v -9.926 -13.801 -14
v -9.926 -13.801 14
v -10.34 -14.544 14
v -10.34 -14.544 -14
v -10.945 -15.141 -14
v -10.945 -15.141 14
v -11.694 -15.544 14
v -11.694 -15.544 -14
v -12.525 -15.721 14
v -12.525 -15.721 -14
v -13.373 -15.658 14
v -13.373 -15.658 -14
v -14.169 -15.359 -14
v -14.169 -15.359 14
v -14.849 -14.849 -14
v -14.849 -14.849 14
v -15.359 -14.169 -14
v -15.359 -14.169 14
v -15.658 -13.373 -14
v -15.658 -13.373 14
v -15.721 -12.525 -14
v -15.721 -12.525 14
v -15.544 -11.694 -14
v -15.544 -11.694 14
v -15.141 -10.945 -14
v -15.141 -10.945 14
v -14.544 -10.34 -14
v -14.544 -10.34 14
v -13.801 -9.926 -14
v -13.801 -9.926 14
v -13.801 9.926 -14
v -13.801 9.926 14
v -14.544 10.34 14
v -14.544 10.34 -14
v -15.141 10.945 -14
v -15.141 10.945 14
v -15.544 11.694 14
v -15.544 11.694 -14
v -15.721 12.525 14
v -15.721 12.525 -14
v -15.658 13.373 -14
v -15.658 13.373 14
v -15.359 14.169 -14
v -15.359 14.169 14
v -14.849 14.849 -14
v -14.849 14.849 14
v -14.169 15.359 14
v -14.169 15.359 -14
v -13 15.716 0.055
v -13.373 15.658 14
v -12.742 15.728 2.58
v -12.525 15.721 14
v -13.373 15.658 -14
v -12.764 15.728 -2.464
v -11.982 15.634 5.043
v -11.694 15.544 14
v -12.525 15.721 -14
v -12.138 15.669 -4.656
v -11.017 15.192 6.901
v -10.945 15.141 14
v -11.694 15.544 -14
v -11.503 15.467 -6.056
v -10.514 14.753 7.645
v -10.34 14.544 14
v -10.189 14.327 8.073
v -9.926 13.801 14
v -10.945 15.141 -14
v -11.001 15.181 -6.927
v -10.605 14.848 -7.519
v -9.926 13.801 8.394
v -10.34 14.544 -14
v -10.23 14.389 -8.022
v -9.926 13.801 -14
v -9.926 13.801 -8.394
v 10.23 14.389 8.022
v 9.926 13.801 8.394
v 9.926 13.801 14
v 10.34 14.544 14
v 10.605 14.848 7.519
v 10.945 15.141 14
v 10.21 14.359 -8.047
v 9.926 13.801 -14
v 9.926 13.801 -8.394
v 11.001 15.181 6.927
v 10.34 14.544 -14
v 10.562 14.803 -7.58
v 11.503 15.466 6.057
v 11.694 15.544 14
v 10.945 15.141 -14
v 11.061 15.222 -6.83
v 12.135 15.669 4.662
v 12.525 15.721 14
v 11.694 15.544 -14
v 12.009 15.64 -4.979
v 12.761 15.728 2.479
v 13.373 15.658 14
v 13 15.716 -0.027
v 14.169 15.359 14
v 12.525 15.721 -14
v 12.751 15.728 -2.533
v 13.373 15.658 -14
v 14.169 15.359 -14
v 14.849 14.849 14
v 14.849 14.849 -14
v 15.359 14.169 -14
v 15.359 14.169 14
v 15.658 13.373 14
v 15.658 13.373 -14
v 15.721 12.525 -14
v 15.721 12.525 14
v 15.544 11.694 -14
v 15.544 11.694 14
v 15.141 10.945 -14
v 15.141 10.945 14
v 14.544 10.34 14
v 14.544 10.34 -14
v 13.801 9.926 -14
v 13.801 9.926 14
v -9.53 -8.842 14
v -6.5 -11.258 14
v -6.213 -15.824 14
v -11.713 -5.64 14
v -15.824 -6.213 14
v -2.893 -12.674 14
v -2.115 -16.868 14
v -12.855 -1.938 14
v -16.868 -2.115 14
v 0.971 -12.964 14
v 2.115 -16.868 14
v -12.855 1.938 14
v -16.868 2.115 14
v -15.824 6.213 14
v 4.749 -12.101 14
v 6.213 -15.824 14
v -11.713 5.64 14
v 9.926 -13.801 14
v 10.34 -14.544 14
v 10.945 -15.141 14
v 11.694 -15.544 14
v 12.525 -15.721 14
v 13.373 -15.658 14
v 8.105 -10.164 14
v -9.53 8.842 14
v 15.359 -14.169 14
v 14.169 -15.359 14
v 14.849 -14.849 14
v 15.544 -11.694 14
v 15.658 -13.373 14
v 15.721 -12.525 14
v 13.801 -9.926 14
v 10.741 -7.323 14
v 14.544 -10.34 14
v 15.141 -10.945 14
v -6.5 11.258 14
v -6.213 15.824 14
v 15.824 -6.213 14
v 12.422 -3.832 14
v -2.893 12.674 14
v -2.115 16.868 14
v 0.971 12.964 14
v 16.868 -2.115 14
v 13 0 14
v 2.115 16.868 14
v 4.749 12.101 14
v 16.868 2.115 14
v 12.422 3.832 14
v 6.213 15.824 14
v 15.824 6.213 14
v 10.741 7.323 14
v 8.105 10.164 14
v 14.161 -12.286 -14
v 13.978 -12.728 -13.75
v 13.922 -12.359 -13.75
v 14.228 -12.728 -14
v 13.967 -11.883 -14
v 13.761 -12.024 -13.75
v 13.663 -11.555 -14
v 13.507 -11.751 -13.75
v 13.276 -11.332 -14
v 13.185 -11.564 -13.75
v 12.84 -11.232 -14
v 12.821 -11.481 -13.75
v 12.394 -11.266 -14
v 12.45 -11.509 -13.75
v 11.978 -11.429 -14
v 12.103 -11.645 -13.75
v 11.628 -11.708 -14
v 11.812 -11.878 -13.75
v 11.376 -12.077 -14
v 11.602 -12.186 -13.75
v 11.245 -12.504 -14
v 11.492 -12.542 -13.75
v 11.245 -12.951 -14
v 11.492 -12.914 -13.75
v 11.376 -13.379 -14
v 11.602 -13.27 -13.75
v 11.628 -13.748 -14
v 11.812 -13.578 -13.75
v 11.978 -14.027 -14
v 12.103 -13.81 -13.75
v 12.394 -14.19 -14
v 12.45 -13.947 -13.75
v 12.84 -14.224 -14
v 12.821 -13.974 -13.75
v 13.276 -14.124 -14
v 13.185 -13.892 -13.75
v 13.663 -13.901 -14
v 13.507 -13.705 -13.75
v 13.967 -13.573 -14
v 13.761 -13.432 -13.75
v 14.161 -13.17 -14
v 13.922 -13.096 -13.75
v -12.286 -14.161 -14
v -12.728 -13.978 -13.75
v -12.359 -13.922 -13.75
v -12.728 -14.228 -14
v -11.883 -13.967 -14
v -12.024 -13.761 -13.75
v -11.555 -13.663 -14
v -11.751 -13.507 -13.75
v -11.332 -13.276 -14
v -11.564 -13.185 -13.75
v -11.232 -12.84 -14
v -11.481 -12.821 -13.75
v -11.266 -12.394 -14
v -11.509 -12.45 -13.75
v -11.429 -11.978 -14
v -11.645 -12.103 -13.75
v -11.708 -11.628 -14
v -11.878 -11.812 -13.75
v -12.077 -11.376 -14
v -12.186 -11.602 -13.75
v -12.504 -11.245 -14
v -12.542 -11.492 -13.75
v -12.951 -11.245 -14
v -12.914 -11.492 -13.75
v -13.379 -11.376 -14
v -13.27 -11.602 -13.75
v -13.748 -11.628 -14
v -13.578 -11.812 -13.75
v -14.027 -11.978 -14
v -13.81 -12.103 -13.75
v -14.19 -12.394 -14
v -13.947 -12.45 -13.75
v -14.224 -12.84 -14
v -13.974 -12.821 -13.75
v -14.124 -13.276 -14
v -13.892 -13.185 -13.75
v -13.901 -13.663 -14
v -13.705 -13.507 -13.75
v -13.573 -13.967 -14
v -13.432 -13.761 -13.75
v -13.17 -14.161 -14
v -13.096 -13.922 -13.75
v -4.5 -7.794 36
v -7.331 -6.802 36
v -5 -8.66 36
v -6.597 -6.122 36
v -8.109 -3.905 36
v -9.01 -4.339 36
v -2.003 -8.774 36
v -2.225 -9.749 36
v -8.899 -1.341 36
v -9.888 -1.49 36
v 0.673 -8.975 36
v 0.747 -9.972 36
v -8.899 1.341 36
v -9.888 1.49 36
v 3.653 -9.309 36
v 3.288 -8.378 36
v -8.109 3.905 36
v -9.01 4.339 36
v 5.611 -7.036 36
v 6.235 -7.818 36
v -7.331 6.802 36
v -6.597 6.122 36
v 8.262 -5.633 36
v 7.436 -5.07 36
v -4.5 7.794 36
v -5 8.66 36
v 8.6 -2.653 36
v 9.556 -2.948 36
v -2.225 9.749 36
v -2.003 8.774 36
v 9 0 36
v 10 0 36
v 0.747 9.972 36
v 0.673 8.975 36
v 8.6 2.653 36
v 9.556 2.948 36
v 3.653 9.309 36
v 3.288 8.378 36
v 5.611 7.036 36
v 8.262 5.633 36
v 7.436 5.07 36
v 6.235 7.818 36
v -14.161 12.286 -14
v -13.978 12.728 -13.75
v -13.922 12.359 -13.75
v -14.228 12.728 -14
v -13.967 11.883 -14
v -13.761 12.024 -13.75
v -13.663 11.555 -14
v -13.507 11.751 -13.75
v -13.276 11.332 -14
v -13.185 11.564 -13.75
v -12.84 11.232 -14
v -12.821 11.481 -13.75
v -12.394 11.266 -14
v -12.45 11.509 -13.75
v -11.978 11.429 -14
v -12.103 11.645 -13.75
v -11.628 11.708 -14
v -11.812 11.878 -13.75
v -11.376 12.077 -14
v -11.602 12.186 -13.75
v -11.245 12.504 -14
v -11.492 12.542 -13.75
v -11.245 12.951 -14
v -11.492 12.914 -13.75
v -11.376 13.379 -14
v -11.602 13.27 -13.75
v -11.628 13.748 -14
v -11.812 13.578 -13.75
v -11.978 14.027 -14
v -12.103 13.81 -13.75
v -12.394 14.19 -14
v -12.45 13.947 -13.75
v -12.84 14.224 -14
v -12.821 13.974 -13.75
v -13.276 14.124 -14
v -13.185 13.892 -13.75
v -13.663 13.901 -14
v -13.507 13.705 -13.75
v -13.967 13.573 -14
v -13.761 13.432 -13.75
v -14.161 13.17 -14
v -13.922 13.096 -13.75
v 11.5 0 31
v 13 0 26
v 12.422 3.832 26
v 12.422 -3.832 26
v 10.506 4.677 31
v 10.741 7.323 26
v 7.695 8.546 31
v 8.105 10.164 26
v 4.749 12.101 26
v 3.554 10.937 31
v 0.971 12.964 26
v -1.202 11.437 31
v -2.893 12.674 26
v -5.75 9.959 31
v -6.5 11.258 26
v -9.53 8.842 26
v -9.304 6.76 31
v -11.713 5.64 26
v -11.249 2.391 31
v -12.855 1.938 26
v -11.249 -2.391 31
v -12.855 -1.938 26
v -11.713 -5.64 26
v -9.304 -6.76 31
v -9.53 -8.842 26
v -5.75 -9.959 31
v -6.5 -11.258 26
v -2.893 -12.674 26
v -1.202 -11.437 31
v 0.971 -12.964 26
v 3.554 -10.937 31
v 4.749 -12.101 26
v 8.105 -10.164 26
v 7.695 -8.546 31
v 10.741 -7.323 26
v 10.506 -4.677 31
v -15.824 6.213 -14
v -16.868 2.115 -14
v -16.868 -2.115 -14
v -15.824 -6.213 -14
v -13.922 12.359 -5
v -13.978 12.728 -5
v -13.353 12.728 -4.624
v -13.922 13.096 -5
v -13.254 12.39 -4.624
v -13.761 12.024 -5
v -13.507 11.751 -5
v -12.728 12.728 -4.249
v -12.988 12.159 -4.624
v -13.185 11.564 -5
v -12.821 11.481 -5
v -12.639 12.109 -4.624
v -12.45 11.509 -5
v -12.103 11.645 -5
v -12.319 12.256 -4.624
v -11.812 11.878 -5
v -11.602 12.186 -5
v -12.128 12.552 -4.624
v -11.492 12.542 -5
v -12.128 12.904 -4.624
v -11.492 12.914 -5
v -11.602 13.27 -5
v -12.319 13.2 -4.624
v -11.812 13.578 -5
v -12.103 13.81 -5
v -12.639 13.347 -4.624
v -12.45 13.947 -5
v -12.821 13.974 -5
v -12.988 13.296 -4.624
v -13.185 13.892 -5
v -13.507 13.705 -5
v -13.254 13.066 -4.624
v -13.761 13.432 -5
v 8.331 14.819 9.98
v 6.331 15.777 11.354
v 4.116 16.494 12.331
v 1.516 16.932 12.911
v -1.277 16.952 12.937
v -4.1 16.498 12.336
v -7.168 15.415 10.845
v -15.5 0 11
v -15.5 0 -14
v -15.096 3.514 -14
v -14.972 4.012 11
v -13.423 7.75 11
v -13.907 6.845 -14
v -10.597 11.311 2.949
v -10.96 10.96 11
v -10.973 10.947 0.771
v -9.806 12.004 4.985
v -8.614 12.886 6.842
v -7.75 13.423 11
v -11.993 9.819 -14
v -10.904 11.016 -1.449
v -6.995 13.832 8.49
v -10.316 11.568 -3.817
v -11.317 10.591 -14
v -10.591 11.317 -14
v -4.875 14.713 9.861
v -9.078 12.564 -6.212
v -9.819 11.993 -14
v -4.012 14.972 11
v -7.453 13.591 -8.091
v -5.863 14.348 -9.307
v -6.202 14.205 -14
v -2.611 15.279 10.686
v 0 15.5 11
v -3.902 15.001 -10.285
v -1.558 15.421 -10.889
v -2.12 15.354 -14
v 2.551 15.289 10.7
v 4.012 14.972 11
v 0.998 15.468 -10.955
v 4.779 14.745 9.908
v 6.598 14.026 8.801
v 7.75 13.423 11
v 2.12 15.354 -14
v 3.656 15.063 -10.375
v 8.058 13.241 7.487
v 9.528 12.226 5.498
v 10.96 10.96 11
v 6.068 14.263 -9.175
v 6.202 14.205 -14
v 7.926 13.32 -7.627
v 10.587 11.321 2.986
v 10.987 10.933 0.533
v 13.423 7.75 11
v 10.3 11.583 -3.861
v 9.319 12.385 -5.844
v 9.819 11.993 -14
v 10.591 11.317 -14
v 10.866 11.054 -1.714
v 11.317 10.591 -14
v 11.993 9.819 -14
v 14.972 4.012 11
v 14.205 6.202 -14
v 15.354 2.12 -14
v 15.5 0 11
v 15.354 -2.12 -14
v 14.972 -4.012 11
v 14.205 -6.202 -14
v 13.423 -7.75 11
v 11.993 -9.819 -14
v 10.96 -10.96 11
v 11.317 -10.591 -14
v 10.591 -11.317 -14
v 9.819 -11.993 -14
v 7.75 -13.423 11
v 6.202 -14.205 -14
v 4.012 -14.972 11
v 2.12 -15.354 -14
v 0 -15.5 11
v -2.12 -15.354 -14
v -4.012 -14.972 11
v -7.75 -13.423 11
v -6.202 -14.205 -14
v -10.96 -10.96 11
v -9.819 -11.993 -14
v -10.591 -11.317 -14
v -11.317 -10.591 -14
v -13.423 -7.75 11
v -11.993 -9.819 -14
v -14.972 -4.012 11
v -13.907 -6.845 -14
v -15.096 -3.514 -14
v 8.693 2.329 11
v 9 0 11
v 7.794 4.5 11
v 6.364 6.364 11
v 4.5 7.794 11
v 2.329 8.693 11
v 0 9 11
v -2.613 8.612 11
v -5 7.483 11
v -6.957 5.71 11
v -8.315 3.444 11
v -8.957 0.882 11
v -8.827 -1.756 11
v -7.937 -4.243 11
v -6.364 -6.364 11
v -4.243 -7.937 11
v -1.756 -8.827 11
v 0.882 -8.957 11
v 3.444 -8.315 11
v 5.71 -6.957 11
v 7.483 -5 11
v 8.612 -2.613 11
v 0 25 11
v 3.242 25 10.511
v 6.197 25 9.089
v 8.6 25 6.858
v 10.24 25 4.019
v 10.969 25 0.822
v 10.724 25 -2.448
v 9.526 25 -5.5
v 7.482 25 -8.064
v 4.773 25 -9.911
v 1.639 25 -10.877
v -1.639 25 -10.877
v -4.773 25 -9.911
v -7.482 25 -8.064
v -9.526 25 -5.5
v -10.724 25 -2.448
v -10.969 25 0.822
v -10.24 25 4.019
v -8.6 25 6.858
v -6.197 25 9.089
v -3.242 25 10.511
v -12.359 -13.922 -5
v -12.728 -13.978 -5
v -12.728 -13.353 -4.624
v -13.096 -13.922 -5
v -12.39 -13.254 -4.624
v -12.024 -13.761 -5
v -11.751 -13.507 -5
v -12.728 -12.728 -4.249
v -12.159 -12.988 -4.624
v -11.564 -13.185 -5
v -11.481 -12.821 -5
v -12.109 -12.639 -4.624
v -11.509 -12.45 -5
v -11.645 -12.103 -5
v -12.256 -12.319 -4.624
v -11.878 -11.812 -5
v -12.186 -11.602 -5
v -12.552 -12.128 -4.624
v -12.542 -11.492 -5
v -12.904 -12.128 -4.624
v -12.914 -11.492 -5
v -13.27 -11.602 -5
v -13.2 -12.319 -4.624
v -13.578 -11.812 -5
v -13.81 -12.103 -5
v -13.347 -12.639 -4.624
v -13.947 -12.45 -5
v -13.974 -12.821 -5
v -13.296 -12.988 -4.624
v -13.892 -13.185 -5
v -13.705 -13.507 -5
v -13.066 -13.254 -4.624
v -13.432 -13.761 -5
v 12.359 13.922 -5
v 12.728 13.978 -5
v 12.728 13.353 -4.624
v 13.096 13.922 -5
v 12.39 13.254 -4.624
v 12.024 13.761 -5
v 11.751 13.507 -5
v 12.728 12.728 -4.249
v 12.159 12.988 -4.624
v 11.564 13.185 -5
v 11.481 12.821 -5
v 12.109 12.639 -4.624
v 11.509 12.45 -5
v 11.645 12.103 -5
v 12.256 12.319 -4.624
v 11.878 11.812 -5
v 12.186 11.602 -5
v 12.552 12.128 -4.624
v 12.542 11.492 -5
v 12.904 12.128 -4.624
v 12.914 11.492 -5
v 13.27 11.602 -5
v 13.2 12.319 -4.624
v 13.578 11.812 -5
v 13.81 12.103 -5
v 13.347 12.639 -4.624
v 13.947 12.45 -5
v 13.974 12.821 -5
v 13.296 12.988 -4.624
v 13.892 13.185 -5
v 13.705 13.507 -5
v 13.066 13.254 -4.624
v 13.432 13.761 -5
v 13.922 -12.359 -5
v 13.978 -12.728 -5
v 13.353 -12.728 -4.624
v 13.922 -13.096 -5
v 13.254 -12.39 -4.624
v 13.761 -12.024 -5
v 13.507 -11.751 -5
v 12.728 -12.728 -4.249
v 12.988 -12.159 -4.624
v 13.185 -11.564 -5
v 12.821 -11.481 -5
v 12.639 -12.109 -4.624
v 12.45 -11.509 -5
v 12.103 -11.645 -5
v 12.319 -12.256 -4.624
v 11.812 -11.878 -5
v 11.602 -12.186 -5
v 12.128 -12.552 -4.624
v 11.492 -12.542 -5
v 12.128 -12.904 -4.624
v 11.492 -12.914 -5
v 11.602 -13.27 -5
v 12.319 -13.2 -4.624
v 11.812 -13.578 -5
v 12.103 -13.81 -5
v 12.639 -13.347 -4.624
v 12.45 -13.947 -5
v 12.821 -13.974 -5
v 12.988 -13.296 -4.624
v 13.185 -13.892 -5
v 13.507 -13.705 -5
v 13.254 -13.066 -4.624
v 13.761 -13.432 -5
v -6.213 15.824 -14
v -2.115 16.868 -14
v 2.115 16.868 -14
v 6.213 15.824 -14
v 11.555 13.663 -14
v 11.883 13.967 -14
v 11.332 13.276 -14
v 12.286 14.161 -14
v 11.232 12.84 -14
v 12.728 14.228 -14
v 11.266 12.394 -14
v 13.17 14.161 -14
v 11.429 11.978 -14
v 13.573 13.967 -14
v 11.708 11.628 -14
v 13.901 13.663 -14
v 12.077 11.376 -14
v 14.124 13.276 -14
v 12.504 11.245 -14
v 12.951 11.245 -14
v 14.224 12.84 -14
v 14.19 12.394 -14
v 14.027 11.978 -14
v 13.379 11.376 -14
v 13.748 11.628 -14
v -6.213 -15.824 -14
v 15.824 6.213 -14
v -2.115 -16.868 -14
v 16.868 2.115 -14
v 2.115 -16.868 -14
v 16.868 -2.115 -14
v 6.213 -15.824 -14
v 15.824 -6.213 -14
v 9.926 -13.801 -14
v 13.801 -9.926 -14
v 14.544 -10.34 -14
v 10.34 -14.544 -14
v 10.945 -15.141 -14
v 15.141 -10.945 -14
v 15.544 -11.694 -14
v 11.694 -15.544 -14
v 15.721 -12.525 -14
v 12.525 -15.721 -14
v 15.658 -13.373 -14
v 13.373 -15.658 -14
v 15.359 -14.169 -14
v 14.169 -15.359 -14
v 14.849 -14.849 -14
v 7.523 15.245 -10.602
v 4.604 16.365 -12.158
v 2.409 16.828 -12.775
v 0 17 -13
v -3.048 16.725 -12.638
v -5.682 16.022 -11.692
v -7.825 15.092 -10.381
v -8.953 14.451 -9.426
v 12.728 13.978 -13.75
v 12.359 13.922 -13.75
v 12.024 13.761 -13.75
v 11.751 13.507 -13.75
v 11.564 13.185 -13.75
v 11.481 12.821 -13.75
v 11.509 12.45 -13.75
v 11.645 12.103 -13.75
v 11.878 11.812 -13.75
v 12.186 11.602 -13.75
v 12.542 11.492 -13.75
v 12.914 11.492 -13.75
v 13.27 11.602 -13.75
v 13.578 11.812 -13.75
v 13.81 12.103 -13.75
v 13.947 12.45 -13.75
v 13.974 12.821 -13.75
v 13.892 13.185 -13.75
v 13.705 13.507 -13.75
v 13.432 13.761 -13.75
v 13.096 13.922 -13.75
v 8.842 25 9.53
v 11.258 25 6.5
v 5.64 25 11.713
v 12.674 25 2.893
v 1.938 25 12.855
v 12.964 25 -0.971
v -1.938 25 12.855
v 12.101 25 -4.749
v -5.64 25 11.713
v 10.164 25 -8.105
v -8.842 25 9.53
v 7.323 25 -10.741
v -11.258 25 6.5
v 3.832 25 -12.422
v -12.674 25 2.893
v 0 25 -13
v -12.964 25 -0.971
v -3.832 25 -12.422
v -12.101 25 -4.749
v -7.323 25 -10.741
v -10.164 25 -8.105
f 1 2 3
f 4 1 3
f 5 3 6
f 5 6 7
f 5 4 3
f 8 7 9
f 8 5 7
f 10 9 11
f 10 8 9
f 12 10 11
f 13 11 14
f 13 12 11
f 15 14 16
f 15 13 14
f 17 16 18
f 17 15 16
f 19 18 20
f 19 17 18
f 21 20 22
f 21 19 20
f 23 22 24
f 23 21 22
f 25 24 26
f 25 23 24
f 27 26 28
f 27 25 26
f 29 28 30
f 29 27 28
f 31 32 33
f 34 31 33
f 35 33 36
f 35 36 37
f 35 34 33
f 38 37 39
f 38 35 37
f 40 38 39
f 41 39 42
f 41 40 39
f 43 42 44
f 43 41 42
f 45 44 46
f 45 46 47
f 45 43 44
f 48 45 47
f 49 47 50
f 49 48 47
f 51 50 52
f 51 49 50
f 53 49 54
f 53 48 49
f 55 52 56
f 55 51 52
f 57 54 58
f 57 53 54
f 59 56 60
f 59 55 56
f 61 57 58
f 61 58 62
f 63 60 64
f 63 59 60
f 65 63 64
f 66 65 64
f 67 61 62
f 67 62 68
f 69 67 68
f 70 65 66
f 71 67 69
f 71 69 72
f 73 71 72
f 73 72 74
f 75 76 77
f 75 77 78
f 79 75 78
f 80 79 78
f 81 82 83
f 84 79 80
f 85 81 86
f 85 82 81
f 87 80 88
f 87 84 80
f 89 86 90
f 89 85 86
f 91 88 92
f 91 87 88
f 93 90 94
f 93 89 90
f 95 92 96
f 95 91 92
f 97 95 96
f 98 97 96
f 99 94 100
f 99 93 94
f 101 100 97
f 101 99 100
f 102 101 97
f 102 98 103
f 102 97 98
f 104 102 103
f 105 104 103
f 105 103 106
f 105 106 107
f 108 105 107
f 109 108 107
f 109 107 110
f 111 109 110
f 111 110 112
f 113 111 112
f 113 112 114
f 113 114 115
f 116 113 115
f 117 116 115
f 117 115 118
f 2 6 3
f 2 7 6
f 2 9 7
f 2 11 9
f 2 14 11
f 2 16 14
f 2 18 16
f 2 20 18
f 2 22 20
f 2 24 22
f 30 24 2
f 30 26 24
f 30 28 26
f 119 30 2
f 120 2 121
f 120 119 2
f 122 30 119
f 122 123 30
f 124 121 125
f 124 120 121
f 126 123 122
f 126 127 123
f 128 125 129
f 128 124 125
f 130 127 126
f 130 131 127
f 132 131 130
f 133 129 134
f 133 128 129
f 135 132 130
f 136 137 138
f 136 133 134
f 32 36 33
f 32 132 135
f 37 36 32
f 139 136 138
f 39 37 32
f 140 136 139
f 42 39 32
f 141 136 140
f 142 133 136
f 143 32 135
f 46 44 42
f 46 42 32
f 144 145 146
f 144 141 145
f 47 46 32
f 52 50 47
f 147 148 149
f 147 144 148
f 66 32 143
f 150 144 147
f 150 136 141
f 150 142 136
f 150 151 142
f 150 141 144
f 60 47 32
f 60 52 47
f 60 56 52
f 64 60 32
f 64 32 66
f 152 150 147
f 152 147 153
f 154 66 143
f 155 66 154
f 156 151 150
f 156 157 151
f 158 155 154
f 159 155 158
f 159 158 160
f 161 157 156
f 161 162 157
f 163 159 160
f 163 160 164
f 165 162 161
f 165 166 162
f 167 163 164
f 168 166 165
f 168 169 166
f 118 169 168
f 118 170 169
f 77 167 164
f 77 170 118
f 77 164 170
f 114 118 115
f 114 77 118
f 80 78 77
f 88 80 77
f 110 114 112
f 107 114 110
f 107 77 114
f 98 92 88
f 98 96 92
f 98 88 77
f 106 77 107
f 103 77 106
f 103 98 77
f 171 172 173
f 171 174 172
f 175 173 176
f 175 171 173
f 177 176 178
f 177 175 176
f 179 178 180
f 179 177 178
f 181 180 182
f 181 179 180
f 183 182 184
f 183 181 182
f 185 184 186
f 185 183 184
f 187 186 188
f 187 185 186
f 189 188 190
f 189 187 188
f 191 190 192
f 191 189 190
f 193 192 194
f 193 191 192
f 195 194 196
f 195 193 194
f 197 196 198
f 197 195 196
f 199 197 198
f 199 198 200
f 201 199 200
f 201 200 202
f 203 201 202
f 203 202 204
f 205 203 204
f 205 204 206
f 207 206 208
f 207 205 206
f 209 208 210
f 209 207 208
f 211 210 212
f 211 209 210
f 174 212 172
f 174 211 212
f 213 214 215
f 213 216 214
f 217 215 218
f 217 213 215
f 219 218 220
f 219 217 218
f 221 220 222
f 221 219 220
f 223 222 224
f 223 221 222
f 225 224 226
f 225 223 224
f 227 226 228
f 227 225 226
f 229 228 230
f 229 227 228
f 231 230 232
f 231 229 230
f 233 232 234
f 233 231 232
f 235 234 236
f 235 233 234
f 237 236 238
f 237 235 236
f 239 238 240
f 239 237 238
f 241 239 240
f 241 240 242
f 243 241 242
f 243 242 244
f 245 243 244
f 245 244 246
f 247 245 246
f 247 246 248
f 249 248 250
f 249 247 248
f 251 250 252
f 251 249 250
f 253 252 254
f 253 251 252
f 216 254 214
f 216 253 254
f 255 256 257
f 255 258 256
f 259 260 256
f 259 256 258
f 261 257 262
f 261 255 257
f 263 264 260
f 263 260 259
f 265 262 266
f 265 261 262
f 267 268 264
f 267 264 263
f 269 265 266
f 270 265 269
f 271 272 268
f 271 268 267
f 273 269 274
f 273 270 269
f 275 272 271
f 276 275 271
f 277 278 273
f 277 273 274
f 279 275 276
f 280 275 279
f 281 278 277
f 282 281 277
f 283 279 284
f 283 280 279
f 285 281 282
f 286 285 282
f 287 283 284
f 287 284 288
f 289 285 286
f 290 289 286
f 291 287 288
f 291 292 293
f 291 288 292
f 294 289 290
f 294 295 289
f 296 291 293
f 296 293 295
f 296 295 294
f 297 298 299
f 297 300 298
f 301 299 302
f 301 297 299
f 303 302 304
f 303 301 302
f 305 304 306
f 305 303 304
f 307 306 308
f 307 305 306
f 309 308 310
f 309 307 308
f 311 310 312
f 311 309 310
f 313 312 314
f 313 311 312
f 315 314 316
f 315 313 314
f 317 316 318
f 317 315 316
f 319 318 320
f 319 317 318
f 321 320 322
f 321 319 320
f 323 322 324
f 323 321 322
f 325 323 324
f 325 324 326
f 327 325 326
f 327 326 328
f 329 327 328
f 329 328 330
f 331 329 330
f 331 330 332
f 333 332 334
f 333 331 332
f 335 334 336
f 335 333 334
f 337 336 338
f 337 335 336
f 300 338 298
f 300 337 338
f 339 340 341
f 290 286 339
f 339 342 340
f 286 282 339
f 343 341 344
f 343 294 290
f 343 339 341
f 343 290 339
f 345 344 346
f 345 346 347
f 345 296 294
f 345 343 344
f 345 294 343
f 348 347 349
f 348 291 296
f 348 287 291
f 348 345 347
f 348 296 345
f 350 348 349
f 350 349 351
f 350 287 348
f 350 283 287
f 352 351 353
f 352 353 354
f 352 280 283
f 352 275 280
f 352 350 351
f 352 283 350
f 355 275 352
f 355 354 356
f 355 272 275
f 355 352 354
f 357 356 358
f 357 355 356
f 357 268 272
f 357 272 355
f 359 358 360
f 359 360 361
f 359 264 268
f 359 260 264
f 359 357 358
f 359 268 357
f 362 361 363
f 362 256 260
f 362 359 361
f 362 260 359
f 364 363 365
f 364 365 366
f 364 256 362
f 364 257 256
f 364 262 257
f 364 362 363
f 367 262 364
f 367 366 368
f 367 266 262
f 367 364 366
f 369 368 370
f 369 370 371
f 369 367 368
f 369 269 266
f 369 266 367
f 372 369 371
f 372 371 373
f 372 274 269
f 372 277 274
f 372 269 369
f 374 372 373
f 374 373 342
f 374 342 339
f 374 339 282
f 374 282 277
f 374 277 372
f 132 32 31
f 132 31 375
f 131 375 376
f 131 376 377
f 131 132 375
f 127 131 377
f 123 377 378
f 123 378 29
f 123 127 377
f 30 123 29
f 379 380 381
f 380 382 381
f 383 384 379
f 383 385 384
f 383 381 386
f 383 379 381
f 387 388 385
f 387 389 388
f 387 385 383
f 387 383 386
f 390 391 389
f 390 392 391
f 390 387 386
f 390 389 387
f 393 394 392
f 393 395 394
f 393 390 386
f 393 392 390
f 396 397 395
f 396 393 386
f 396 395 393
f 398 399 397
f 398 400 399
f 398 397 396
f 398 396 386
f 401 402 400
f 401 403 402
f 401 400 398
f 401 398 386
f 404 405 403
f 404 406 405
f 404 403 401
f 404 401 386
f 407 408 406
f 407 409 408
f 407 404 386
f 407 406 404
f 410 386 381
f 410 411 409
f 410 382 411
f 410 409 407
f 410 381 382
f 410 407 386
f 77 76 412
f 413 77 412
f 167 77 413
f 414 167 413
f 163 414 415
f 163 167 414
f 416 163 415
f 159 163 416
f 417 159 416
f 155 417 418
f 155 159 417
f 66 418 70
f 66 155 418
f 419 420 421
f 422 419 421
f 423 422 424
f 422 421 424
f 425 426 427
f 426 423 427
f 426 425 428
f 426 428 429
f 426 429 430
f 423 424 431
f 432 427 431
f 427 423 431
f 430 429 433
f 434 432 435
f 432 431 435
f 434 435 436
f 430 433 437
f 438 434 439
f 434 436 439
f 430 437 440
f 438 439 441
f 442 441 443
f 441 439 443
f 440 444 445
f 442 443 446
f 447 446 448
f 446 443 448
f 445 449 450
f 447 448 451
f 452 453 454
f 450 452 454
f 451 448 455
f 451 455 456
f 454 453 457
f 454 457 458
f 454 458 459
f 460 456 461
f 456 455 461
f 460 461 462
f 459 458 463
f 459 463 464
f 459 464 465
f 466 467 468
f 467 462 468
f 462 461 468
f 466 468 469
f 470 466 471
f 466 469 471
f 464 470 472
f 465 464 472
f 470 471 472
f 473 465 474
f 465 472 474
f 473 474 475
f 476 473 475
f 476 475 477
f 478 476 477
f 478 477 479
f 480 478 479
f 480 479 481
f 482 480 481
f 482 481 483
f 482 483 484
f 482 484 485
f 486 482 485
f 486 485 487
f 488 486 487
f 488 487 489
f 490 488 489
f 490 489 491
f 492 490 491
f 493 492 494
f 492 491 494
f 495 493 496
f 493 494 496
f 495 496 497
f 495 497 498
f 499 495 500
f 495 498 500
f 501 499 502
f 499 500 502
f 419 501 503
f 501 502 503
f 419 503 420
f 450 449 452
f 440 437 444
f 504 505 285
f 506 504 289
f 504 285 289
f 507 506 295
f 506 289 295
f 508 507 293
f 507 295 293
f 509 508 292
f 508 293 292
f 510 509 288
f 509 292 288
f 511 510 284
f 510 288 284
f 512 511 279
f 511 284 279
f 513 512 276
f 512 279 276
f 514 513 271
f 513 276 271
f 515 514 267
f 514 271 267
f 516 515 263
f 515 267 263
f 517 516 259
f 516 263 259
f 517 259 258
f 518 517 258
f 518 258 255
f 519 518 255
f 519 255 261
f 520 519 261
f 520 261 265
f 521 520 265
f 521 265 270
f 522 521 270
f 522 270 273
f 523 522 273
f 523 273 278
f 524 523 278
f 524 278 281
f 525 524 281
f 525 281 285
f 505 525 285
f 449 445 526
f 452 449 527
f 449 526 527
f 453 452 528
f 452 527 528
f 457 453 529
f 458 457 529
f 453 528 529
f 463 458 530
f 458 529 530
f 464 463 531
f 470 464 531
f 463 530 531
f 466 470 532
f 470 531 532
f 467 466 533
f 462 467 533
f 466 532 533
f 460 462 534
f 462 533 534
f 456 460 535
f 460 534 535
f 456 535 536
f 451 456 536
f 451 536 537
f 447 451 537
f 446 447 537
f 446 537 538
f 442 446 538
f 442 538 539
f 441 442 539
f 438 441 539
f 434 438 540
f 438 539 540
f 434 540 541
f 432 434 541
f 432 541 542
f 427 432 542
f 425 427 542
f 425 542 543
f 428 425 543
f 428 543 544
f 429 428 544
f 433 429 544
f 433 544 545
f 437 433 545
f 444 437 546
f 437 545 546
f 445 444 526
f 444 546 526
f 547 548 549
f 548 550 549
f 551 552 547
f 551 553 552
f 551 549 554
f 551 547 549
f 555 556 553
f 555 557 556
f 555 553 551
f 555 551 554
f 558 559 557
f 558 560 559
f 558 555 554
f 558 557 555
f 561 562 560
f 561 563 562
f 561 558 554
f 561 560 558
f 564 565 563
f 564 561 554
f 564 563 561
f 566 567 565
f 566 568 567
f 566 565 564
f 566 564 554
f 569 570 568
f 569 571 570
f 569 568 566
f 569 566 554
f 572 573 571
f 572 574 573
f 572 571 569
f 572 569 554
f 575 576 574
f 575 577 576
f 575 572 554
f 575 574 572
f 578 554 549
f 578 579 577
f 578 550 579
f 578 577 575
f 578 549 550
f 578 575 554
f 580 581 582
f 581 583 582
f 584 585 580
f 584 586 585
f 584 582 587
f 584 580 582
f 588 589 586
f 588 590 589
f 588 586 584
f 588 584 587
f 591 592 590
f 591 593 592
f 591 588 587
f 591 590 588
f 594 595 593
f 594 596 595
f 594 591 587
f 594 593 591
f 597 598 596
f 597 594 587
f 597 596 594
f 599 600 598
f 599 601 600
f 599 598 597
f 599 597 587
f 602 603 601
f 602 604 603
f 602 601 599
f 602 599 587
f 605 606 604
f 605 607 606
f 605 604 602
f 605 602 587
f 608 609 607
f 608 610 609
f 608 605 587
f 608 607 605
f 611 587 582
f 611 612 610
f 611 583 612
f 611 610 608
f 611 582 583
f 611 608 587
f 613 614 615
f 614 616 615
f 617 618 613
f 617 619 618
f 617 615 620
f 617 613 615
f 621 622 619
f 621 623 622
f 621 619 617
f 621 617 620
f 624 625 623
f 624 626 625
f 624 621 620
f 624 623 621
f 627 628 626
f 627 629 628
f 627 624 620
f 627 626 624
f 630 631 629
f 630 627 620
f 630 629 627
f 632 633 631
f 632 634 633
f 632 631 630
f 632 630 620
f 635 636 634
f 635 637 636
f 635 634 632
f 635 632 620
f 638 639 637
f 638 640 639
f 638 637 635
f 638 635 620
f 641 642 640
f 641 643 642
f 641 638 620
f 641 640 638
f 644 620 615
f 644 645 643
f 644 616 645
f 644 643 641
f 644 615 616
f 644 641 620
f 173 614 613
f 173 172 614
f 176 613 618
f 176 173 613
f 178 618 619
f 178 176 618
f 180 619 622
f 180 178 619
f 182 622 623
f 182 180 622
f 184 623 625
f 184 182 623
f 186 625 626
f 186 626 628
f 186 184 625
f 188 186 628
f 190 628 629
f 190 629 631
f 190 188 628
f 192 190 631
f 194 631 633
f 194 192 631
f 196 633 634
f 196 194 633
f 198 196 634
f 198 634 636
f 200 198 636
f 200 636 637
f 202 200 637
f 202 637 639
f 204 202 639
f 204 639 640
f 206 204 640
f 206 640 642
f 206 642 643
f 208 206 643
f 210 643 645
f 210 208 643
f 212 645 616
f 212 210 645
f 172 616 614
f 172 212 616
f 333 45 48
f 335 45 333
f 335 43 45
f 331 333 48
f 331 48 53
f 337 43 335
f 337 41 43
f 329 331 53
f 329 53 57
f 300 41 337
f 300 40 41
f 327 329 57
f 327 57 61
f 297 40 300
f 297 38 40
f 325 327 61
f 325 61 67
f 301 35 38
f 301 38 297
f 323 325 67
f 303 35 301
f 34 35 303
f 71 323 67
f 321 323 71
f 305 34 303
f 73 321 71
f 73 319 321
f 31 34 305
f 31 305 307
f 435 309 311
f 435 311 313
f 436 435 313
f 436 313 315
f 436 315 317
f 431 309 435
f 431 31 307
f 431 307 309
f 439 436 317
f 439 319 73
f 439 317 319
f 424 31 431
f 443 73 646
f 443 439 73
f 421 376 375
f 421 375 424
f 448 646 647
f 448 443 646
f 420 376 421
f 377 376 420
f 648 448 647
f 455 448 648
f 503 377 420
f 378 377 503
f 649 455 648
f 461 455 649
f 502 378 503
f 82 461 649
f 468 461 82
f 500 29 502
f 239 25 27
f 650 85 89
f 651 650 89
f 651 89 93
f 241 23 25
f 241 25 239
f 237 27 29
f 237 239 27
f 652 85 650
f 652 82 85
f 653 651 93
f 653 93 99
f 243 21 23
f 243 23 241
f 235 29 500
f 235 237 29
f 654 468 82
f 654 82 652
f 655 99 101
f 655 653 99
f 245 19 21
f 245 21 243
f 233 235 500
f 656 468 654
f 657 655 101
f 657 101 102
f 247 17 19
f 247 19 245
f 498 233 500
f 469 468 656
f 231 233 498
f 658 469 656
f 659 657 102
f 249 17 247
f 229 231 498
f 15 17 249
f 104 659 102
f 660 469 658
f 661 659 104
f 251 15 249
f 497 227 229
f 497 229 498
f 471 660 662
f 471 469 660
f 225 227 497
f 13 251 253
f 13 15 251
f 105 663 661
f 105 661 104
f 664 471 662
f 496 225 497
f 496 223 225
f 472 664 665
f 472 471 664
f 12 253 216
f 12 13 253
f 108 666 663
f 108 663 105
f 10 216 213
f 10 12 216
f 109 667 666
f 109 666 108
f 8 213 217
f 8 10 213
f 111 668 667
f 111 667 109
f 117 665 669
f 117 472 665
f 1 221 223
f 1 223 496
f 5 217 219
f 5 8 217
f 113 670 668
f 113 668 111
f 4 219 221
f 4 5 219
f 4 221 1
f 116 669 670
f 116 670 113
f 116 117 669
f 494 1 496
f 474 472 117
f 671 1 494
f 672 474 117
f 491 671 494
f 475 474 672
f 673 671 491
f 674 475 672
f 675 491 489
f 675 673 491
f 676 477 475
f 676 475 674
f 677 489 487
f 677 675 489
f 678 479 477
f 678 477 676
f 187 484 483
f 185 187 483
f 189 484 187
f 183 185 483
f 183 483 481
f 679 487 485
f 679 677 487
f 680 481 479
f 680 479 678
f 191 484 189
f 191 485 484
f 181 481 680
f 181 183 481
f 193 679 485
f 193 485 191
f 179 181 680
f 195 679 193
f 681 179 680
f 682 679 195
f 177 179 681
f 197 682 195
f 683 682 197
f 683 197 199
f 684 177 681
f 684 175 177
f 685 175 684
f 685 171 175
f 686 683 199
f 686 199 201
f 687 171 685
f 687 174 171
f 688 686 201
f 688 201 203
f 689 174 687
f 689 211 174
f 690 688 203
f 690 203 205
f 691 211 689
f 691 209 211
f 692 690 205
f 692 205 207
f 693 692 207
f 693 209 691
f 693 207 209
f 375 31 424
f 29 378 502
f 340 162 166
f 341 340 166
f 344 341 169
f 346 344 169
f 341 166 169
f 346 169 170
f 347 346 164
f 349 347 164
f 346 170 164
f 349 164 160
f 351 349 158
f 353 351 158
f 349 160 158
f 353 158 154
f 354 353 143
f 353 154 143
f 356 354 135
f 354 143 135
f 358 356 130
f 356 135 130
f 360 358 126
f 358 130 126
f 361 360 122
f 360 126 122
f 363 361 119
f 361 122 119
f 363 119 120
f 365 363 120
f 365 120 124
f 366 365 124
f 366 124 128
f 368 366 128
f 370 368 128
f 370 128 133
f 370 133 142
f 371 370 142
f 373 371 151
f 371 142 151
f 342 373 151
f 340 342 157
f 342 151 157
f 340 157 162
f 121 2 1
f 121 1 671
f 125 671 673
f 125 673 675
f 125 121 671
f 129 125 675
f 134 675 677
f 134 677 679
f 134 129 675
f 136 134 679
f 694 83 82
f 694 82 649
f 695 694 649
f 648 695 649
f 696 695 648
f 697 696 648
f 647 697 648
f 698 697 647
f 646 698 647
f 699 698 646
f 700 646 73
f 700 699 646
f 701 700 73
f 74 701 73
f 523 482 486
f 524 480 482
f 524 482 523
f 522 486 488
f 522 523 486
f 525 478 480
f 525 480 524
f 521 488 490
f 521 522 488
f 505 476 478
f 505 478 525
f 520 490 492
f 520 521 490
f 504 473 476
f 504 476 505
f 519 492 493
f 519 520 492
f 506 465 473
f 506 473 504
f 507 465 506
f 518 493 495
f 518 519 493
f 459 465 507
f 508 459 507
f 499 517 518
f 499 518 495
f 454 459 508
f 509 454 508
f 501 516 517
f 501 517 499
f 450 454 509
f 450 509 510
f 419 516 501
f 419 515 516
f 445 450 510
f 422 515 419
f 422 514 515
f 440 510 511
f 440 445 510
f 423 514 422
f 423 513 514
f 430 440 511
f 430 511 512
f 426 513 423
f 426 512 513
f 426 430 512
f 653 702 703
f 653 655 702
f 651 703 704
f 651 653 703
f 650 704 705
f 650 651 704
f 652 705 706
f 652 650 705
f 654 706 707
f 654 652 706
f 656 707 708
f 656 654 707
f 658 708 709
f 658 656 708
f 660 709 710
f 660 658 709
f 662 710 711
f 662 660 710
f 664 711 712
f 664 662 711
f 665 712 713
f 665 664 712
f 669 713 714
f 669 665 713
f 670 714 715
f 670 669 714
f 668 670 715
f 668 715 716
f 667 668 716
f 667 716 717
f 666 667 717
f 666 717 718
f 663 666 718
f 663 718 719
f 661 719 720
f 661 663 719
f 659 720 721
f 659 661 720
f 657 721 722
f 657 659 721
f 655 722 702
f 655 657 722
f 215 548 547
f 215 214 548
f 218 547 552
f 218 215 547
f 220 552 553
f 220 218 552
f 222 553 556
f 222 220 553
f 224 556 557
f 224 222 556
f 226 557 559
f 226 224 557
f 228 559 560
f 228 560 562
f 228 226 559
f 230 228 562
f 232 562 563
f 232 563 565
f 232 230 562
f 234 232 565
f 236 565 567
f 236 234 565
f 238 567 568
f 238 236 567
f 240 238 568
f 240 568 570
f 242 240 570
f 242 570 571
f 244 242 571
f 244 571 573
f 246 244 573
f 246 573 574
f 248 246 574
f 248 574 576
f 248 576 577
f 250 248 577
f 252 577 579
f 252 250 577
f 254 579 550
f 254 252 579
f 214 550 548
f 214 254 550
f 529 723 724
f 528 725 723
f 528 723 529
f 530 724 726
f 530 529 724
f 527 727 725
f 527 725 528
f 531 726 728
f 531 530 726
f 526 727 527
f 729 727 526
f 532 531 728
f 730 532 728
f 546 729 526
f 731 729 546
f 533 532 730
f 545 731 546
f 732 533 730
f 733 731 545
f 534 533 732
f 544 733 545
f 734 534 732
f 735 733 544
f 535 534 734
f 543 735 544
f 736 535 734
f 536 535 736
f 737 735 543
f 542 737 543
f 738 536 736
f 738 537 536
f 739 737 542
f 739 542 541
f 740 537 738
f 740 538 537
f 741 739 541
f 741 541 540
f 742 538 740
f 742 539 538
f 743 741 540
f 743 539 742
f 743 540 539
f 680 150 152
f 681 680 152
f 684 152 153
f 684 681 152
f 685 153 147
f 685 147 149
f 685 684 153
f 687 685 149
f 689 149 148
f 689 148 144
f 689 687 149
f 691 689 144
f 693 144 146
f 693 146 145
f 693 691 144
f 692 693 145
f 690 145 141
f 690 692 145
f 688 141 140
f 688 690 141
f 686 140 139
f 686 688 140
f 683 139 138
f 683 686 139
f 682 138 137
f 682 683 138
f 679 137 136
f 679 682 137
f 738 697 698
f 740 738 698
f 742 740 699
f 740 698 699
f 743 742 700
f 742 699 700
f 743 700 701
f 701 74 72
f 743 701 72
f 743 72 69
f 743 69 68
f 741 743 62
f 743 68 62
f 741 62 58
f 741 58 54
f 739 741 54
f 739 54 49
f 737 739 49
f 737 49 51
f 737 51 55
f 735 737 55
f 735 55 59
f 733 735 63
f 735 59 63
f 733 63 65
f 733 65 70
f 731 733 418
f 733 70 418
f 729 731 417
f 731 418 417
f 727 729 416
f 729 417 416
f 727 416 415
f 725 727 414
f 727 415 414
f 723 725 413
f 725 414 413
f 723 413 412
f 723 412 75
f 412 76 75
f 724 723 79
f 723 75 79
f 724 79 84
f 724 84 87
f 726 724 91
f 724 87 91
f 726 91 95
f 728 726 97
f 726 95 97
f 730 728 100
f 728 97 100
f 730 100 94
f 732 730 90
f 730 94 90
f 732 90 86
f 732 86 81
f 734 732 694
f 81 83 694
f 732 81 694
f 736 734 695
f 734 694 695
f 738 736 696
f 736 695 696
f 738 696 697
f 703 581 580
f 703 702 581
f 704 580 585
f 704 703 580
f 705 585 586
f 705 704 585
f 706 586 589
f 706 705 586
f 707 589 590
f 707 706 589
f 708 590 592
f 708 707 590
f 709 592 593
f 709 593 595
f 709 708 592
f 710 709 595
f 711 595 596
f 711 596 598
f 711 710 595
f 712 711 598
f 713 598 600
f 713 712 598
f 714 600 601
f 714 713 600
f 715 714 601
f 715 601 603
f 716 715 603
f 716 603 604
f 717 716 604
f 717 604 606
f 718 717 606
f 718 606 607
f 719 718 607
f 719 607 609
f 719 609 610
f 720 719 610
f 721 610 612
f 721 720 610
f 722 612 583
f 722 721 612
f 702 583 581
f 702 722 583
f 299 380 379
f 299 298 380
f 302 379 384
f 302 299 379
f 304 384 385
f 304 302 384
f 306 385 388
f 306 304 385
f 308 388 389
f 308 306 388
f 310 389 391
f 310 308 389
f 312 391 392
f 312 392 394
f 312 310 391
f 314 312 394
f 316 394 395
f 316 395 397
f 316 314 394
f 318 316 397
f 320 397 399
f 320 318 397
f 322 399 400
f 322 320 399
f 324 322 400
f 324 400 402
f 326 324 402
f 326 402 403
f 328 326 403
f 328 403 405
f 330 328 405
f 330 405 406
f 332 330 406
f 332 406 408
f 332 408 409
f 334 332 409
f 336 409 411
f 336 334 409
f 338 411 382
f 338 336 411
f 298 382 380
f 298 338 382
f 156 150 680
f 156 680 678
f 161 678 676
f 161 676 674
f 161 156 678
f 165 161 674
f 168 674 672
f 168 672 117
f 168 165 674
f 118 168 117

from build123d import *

# Parameters (mm, degrees)
SKETCH1_R           = 17
BOSS_EXTRUDE1_DEPTH = 14
SKETCH2_R           = 13
BOSS_EXTRUDE2_DEPTH = 22
SKETCH3_R           = 13
BOSS_EXTRUDE3_DEPTH = 25
SKETCH4_R           = 15.5
CUT_EXTRUDE1_DEPTH  = 25
SKETCH5_R           = 9
CUT_EXTRUDE2_DEPTH  = 25
CHAMFER2_SIZE       = 10
CHAMFER2_SIZE2      = 3
BOSS_EXTRUDE4_DEPTH = 28
CIRPATTERN1_COUNT   = 4
SKETCH6_R           = 11
CUT_EXTRUDE3_DEPTH  = 25
CIRPATTERN2_COUNT   = 4


with BuildPart() as part:
    # Sketch1 → Boss-Extrude1 (new body, symmetric)
    with BuildSketch(Plane.XY):
        Circle(SKETCH1_R)
    extrude(amount=BOSS_EXTRUDE1_DEPTH, both=True)

    # Sketch2 → Boss-Extrude2 (add)
    with BuildSketch(Plane.XY.offset(14)):
        Circle(SKETCH2_R)
    extrude(amount=BOSS_EXTRUDE2_DEPTH)

    # Sketch3 → Boss-Extrude3 (add)
    with BuildSketch(Plane(origin=(0, 0, 0), x_dir=(1, 0, 0), z_dir=(0, 1, 0))):
        with Locations(Location((0, 0, 0), (0, 0, 90))):  # turned: the seam where the file's is
            Circle(SKETCH3_R)
    extrude(amount=BOSS_EXTRUDE3_DEPTH)

    # Sketch4 → Cut-Extrude1 (cut)
    with BuildSketch(Plane(origin=(0, 0, -14), x_dir=(-1, 0, 0), z_dir=(0, 0, -1))):
        Circle(SKETCH4_R)
    extrude(amount=-CUT_EXTRUDE1_DEPTH, mode=Mode.SUBTRACT)

    # Sketch5 → Cut-Extrude2 (cut)
    with BuildSketch(Plane.XY.offset(36)):
        Circle(SKETCH5_R)
    extrude(amount=-CUT_EXTRUDE2_DEPTH, mode=Mode.SUBTRACT)

    # Chamfer2
    chamfer2_edges = [part.edges().sort_by_distance(p)[0] for p in [
        (-13, 0, 36),
    ]]
    chamfer2_side = [part.faces().sort_by_distance(p)[0] for p in [
        (-13, 0, 25),
    ]]
    chamfer(chamfer2_edges, length=CHAMFER2_SIZE, length2=CHAMFER2_SIZE2, reference=chamfer2_side[0])

    # Sketch7 → Boss-Extrude4 (add)
    with BuildSketch(Plane(origin=(0, 0, -14), x_dir=(-1, 0, 0), z_dir=(0, 0, -1))):
        with BuildLine():
            ThreePointArc((-9.819351092, 11.992928922), (-14.849242405, 14.849242405), (-11.992928922, 9.819351092))
            ThreePointArc((-11.992928922, 9.819351092), (-10.960155108, 10.960155108), (-9.819351092, 11.992928922))
        make_face()
    boss_extrude4 = extrude(amount=-BOSS_EXTRUDE4_DEPTH)

    # CirPattern1: Boss-Extrude4 ×4 about axis
    cirpattern1_axis = Axis((0, 0, 0), (0, 0, 1))
    for i in range(1, CIRPATTERN1_COUNT):
        add(boss_extrude4.rotate(cirpattern1_axis, i * 360 / CIRPATTERN1_COUNT))

    # Sketch6 → Cut-Extrude3 (cut)
    with BuildSketch(Plane(origin=(0, 25, 0), x_dir=(1, 0, 0), z_dir=(0, 1, 0))):
        with Locations(Location((0, 0, 0), (0, 0, 270))):  # turned: the seam where the file's is
            Circle(SKETCH6_R)
    extrude(amount=-CUT_EXTRUDE3_DEPTH, mode=Mode.SUBTRACT)

    # Sketch9 → Tap Drill for M3x0.5 Tap1 (revolve, cut)
    with BuildSketch(Plane(origin=(12.727922061, 12.727922061, -14), x_dir=(0, 1, 0), z_dir=(1, 0, 0))):
        Polygon((0, 0), (0, 9.751075774), (1.25, 9), (1.25, 0.25), (1.5, 0), align=None)
    tap_drill_for_m3x0_5_tap1 = revolve(axis=Axis((12.727922061, 12.727922061, -20.35), (0, 0, 1)), mode=Mode.SUBTRACT)

    # CirPattern2: Tap Drill for M3x0.5 Tap1 ×4 about axis
    cirpattern2_axis = Axis((0, 0, 0), (0, 0, 1))
    for i in range(1, CIRPATTERN2_COUNT):
        add(tap_drill_for_m3x0_5_tap1.rotate(cirpattern2_axis, i * 360 / CIRPATTERN2_COUNT), mode=Mode.SUBTRACT)


solid = part.part
